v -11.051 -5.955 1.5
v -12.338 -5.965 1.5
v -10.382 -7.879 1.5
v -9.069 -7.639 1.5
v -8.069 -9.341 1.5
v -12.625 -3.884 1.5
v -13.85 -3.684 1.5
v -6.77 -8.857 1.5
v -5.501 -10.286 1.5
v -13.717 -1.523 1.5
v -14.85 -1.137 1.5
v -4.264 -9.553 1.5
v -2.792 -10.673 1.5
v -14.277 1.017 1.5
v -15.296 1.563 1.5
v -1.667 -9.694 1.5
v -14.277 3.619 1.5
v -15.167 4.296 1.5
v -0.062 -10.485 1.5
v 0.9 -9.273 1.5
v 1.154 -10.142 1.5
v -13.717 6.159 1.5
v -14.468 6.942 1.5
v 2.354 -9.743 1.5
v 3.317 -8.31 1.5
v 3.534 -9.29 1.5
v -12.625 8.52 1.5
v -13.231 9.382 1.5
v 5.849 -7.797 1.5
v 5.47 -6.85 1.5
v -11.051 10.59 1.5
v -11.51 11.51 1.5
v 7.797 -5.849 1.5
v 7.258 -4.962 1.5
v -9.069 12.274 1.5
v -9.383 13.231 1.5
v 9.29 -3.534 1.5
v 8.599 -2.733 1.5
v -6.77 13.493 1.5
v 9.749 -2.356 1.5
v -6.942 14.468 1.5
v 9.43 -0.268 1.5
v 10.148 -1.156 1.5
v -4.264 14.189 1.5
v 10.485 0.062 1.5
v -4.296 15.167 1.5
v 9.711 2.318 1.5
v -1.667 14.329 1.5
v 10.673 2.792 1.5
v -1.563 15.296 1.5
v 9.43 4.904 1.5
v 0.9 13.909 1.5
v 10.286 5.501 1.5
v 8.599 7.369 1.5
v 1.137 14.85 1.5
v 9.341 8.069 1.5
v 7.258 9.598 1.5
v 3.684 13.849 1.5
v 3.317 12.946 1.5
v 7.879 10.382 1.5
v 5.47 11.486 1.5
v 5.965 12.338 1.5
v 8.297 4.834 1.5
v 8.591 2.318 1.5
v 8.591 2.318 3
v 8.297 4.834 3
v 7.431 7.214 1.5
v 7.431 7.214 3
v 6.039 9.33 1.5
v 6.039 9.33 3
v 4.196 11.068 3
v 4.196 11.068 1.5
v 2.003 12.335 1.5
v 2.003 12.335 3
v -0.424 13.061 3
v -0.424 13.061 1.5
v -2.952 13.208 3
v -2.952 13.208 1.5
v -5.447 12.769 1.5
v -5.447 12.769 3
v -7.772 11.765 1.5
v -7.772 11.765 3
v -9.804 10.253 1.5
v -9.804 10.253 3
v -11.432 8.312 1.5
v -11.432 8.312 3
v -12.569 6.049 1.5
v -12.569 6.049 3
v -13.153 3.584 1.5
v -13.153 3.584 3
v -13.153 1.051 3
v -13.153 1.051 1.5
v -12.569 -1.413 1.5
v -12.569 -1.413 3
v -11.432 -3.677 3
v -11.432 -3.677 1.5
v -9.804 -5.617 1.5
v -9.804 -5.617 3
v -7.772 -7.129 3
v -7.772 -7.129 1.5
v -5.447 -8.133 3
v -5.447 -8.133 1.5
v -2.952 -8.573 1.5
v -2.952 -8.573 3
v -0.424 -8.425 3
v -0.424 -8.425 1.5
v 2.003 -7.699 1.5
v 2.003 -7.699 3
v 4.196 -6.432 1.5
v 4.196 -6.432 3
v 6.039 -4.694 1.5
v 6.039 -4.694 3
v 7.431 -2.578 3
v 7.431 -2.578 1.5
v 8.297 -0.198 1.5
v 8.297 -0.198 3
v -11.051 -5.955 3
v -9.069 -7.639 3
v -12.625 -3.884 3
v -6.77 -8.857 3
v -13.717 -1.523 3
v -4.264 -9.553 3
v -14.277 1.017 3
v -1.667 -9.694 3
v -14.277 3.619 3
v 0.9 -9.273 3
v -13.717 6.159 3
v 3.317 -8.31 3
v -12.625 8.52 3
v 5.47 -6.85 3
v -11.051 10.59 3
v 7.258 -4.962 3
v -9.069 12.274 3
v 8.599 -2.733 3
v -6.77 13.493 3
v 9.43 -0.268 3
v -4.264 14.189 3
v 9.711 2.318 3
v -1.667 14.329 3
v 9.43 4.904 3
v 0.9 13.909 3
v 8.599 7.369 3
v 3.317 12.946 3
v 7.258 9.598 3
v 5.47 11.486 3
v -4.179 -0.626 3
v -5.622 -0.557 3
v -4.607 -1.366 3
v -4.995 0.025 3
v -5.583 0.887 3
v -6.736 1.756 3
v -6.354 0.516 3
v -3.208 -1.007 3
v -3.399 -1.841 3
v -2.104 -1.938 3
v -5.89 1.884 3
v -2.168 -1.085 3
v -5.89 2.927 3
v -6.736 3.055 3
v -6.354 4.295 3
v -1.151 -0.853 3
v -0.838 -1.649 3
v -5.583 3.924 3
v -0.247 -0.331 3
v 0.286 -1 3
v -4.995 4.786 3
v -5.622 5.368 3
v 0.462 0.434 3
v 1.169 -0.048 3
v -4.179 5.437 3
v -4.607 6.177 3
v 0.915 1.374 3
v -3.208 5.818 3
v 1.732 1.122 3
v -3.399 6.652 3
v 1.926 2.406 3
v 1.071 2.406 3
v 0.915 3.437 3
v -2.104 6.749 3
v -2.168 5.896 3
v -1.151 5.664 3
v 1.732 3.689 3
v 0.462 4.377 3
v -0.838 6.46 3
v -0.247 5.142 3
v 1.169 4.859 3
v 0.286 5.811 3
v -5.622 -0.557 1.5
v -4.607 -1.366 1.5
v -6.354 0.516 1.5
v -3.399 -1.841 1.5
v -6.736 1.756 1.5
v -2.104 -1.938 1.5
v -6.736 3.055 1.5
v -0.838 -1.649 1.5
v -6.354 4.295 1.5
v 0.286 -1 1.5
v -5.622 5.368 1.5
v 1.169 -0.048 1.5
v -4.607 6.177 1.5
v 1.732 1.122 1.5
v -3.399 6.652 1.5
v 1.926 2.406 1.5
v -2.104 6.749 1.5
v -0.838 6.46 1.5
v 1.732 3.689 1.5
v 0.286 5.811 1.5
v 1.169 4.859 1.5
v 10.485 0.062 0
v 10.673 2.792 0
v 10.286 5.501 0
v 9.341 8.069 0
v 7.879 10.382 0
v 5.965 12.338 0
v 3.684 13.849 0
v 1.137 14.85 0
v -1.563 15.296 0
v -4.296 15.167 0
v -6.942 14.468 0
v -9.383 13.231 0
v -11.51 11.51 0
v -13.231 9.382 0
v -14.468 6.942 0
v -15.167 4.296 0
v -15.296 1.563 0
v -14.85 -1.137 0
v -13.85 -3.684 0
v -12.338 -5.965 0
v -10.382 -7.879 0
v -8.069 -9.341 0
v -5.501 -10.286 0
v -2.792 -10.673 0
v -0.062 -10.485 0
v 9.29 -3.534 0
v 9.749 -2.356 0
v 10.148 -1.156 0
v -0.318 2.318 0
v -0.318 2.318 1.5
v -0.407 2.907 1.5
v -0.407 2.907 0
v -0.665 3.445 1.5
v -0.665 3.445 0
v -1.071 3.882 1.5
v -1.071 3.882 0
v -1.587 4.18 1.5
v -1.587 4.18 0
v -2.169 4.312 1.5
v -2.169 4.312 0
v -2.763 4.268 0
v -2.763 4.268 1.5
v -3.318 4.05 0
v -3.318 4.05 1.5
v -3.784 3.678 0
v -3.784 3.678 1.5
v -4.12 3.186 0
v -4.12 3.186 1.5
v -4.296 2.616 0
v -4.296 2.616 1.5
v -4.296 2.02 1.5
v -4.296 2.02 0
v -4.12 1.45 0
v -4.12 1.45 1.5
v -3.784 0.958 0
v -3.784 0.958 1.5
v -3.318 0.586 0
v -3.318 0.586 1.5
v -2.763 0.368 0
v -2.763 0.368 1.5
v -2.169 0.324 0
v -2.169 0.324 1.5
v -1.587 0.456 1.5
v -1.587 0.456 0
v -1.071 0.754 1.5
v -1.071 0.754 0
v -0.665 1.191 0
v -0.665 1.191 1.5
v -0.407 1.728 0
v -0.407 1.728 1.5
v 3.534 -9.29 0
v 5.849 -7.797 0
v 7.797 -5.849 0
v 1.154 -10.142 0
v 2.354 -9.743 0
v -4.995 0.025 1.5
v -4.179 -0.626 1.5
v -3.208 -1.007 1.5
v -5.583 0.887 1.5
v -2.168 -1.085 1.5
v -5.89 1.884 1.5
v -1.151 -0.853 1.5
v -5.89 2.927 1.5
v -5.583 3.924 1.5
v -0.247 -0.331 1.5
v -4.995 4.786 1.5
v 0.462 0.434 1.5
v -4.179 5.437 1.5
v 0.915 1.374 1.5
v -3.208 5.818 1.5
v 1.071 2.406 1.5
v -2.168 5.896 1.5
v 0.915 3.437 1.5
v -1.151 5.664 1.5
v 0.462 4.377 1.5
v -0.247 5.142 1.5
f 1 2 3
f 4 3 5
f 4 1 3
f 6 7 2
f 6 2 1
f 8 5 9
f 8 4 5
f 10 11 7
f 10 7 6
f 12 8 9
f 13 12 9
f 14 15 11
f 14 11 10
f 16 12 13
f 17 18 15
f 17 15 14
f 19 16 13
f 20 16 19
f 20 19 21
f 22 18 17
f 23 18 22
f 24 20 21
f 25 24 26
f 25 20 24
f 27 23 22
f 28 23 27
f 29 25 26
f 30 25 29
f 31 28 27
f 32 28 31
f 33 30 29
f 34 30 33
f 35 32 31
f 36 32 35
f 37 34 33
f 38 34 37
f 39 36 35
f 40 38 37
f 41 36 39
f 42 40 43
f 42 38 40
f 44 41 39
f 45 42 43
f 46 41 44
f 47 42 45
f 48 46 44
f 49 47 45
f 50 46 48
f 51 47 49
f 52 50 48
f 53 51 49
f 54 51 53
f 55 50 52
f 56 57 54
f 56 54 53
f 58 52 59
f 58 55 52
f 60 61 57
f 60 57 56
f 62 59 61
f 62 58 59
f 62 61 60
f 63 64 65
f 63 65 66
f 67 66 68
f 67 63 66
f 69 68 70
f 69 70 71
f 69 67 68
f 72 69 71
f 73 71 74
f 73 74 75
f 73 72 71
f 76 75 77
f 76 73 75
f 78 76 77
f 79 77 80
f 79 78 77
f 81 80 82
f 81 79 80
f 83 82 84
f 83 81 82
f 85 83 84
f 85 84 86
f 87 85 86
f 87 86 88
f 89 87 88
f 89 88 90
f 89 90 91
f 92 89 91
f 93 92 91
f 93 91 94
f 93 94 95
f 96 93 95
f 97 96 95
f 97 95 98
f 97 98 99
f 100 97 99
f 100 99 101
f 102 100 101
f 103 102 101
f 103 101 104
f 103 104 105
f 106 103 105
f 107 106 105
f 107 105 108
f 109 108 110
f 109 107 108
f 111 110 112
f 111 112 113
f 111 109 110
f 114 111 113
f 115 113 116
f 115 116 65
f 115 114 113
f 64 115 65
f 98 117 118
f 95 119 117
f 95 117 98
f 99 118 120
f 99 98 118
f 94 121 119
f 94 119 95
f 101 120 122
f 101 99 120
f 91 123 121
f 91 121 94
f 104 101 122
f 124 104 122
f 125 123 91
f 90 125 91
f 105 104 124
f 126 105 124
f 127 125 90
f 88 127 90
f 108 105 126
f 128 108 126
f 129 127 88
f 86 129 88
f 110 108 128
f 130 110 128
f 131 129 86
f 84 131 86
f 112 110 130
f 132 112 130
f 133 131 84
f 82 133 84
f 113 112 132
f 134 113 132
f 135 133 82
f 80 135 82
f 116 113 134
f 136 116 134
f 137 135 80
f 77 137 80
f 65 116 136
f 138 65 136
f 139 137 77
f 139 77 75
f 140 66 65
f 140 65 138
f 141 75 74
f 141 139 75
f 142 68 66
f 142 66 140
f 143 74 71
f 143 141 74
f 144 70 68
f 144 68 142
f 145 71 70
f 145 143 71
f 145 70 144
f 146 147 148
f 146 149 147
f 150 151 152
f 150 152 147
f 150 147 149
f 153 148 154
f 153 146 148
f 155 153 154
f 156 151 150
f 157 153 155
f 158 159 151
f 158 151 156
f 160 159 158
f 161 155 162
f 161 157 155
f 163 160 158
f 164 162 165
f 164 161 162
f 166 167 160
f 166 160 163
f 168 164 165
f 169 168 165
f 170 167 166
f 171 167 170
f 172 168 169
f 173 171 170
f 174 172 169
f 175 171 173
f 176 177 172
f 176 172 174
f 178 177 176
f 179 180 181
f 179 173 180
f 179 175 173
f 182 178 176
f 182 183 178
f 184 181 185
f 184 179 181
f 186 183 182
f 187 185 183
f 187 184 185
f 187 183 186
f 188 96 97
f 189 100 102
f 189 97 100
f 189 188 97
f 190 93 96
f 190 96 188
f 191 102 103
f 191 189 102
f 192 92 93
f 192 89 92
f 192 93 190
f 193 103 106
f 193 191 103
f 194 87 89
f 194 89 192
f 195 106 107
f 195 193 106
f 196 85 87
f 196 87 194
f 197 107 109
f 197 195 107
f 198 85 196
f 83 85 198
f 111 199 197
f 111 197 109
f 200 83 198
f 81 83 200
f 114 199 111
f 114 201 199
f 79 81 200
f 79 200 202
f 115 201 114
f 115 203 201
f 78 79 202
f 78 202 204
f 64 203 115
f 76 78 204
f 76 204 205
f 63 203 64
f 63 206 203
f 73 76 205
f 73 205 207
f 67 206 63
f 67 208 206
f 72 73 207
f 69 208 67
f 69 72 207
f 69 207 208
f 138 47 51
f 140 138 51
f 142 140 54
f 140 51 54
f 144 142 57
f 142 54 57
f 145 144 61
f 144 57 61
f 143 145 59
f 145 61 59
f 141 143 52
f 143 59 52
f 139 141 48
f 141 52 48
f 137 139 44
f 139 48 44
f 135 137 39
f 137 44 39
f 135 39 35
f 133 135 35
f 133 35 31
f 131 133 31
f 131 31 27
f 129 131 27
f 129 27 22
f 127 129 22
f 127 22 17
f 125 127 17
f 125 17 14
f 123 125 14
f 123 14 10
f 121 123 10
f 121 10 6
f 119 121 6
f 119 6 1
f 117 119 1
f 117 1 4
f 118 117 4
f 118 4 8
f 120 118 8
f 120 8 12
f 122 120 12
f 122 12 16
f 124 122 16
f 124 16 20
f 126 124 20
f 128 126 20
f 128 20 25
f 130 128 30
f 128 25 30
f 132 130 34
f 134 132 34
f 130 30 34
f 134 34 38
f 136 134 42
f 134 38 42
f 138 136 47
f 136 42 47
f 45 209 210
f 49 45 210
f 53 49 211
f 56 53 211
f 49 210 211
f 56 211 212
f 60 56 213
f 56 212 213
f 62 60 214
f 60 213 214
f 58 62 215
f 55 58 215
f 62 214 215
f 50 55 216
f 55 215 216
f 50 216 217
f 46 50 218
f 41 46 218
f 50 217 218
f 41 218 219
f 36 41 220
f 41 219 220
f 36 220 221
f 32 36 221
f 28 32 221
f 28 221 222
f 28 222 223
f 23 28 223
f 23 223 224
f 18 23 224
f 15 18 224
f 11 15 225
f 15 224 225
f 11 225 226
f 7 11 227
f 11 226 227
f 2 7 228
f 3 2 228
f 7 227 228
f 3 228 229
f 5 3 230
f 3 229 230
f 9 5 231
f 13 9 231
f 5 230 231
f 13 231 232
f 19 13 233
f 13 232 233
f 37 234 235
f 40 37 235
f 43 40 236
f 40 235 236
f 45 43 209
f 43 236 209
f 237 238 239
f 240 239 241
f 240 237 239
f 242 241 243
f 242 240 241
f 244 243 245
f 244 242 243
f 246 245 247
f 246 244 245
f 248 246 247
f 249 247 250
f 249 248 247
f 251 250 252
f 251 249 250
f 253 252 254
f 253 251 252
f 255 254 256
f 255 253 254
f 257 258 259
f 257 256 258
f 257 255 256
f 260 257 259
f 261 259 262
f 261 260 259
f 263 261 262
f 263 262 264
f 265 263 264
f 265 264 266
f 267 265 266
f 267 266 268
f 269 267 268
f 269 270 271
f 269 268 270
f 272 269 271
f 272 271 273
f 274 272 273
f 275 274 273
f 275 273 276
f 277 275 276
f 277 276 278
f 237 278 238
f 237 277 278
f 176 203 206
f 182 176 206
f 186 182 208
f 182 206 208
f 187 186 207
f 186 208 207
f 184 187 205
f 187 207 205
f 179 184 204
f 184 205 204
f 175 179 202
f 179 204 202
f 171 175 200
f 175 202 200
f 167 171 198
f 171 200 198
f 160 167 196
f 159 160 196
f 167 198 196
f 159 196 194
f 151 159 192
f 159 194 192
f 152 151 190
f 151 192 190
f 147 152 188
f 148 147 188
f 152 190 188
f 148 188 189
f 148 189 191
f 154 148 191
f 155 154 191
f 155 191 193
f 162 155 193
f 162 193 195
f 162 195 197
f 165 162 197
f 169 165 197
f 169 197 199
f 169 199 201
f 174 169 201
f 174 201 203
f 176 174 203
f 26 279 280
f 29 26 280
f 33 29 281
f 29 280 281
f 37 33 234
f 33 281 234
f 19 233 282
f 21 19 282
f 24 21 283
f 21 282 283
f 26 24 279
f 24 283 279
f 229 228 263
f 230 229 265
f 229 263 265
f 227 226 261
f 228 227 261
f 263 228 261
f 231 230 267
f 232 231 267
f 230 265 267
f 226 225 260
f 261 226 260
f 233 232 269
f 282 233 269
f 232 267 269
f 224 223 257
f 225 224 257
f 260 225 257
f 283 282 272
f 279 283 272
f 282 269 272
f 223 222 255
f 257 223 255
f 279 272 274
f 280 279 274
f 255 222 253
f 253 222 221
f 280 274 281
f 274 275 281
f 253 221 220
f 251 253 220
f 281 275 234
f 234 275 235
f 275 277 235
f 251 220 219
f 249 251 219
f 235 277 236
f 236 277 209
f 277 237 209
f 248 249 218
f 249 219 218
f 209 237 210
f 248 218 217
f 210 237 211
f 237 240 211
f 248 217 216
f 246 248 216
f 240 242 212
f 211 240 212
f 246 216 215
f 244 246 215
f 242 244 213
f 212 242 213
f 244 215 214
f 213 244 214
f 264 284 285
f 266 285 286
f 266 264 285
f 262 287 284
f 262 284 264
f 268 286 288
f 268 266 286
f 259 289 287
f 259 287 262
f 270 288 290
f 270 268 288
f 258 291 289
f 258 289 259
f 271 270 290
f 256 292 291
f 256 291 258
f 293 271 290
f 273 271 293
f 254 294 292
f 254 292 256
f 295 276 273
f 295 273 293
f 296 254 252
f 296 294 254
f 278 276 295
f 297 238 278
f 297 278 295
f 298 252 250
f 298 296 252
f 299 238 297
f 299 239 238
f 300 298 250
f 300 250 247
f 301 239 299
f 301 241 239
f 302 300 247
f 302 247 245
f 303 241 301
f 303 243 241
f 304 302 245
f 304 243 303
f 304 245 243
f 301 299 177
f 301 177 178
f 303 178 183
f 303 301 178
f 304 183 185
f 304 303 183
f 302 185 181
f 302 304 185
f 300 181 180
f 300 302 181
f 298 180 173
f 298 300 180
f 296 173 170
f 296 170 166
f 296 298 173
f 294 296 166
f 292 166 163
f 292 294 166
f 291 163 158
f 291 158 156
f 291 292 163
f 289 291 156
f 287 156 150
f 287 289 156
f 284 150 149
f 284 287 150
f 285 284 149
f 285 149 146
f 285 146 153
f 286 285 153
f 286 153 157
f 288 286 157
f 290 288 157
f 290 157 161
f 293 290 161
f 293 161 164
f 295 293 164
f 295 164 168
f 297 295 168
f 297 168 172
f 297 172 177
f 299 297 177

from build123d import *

# Parameters (mm, degrees)
F0_R     = 12.0291917003
F0_R_2   = 10.9089247003
F0_R_3   = 10
F0_R_4   = 4.355405347
F0_R_5   = 3.5
F0_R_6   = 2
F1_DEPTH = 1.5
F2_DEPTH = 3
F3_DEPTH = 25.4


with BuildPart() as f1:
    # F0 (on Top) → F1 (new body)
    with BuildSketch(Plane.XY):
        with BuildLine():
            ThreePointArc((9.2903810009, -3.5340649529), (9.956324904, -1.7586338449), (10.4848555288, 0.062435149))
            ThreePointArc((10.4848555288, 0.062435149), (-11.5103310146, 11.5102886119), (-0.0624775516, -10.4848979314))
            ThreePointArc((-0.0624775516, -10.4848979314), (1.7563351899, -9.9492852383), (3.5341859381, -9.2903410352))
            ThreePointArc((3.5341859381, -9.2903410352), (6.8744732182, -6.8743862374), (9.2903810009, -3.5340649529))
        make_face()
        with Locations((-2.3179612439, 2.3179188413)):
            Circle(F0_R, mode=Mode.SUBTRACT)
        with Locations((-2.3179612439, 2.3179188413)):
            Circle(F0_R)
        with Locations((-2.3179612439, 2.3179188413)):
            Circle(F0_R_2, mode=Mode.SUBTRACT)
        with Locations((-2.3179612439, 2.3179188413)):
            Circle(F0_R_2)
        with Locations((-2.4294834584, 2.4055044632)):
            Circle(F0_R_3, mode=Mode.SUBTRACT)
        with Locations((-2.4294834584, 2.4055044632)):
            Circle(F0_R_3)
        with Locations((-2.4294834584, 2.4055044632)):
            Circle(F0_R_4, mode=Mode.SUBTRACT)
        with Locations((-2.4294834584, 2.4055044632)):
            Circle(F0_R_4)
        with Locations((-2.4294834584, 2.4055044632)):
            Circle(F0_R_5, mode=Mode.SUBTRACT)
        with Locations((-2.4294834584, 2.4055044632)):
            Circle(F0_R_5)
        with Locations((-2.3179612439, 2.3179188413)):
            Circle(F0_R_6, mode=Mode.SUBTRACT)
        with Locations((-2.3179612439, 2.3179188413)):
            Circle(F0_R_6)
    extrude(amount=F1_DEPTH)

    # F0 (on Top) → F2 (join)
    with BuildSketch(Plane.XY):
        with Locations((-2.3179612439, 2.3179188413)):
            Circle(F0_R)
        with Locations((-2.3179612439, 2.3179188413)):
            Circle(F0_R_2, mode=Mode.SUBTRACT)
        with Locations((-2.4294834584, 2.4055044632)):
            Circle(F0_R_4)
        with Locations((-2.4294834584, 2.4055044632)):
            Circle(F0_R_5, mode=Mode.SUBTRACT)
    extrude(amount=F2_DEPTH)

    # F0 (on Top) → F3 (cut)
    with BuildSketch(Plane.XY):
        with Locations((-2.3179612439, 2.3179188413)):
            Circle(F0_R_6)
    extrude(amount=F3_DEPTH, mode=Mode.SUBTRACT)


solid = f1.part
